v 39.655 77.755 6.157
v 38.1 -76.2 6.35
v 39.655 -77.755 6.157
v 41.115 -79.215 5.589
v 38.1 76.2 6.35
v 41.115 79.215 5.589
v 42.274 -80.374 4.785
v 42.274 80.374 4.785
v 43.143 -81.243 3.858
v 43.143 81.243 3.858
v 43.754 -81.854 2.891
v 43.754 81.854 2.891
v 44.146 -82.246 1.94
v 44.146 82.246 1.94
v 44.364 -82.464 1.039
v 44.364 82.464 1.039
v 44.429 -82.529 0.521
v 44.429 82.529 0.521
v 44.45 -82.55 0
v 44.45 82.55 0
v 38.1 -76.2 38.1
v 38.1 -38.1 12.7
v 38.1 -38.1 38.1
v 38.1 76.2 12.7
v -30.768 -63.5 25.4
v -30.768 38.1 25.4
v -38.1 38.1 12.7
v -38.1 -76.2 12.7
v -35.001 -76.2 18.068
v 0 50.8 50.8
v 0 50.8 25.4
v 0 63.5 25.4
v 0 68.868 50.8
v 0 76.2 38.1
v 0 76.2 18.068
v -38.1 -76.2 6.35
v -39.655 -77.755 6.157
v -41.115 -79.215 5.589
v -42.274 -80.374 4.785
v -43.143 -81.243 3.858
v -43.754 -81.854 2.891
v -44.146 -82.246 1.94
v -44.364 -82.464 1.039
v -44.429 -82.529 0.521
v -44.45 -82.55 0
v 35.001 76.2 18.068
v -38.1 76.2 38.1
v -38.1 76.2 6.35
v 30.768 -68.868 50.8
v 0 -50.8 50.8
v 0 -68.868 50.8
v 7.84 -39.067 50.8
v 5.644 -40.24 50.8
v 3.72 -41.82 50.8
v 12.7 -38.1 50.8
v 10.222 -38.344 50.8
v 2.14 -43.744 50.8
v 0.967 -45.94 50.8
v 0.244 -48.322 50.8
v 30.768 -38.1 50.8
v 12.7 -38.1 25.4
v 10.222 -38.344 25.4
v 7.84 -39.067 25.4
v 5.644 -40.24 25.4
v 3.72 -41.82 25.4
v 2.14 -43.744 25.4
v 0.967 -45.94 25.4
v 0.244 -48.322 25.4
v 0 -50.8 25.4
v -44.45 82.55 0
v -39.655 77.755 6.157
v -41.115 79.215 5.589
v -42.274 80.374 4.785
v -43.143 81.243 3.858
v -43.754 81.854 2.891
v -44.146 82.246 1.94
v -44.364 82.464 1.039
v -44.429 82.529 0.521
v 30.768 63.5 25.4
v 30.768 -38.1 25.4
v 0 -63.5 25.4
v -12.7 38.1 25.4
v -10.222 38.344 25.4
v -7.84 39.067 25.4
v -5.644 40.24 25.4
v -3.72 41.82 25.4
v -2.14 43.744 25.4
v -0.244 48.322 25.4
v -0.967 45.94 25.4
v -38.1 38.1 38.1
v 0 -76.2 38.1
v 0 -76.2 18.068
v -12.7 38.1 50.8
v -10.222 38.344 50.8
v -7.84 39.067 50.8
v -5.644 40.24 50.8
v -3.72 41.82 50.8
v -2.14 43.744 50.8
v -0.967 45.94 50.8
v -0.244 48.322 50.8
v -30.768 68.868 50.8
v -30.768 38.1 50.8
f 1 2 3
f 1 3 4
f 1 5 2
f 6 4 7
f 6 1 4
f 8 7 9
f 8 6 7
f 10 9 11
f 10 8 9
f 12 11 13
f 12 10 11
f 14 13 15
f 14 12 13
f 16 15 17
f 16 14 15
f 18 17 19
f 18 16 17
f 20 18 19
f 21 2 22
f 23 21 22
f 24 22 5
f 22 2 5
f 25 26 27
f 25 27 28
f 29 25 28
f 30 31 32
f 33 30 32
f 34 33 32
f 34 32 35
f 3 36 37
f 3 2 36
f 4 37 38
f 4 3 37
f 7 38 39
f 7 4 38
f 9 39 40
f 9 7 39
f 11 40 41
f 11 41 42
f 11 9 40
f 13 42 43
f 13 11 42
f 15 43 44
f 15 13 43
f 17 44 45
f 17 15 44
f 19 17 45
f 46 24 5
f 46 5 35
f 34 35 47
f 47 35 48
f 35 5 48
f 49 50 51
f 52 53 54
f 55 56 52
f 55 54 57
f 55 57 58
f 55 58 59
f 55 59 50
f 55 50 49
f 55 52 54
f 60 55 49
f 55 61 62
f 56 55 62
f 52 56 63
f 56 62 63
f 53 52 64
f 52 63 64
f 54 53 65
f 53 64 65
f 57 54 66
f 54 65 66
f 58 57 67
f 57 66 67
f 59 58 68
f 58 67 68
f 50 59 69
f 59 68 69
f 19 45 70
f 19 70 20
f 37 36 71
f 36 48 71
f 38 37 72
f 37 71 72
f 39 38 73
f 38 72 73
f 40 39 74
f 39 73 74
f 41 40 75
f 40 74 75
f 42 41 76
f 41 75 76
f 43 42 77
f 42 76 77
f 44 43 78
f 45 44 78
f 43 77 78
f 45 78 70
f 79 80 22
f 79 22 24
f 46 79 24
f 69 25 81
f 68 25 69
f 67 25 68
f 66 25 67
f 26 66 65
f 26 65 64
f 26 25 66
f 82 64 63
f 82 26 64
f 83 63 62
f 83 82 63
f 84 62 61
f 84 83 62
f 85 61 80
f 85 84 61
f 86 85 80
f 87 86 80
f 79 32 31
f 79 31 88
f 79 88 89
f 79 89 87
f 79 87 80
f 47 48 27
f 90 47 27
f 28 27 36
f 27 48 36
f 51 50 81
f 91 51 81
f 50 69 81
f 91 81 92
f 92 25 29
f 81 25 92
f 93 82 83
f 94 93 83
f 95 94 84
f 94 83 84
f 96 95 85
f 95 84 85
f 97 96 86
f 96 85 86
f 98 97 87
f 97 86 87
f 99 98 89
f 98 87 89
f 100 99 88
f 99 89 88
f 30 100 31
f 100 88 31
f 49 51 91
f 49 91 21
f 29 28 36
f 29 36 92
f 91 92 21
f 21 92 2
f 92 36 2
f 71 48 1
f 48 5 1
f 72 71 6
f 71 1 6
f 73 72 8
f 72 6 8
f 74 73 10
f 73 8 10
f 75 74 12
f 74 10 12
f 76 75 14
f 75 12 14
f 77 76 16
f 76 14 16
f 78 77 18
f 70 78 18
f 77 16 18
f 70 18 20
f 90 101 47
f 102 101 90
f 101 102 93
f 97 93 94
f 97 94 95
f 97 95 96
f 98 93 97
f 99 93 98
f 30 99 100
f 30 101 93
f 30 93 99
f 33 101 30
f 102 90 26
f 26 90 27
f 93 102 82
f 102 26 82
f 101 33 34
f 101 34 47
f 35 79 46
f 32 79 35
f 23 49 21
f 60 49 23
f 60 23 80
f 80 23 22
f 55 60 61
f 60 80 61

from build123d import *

# Parameters (mm, degrees)
F0_W        = 88.9
F0_H        = 165.1
F1_DEPTH    = 6.35
F2_DEPTH    = 25.4
F3_DEPTH    = 50.8
F4_C1_SIZE2 = 7.3323484187
F4_C1_SIZE  = 12.7
F4_C2_SIZE2 = 7.3323484187
F4_C2_SIZE  = 12.7
F4_C3_SIZE2 = 12.7
F4_C3_SIZE  = 7.3323484187
F4_C4_SIZE2 = 7.3323484187
F4_C4_SIZE  = 12.7
F5_C1_SIZE2 = 12.7
F5_C1_SIZE  = 7.3323484187
F5_C2_SIZE2 = 7.3323484187
F5_C2_SIZE  = 12.7
F5_C3_SIZE2 = 7.3323484187
F5_C3_SIZE  = 12.7
F5_C4_SIZE2 = 7.3323484187
F5_C4_SIZE  = 12.7
F6_R        = 6.34999


# Not quite as in the source:
# - a fillet or chamfer is up to 0.001 mm smaller than in the source, because OpenCascade refuses the exact size


with BuildPart() as f1:
    # F0 (on Top) → F1 (new body)
    with BuildSketch(Plane.XY):
        Rectangle(F0_W, F0_H)
        Polygon((0, 76.2), (38.1, 76.2), (38.1, -38.1), (38.1, -76.2), (0, -76.2), (-38.1, -76.2), (-38.1, 38.1), (-38.1, 76.2), align=None, mode=Mode.SUBTRACT)
    extrude(amount=F1_DEPTH)

    # F0 (on Top) → F2 (join)
    with BuildSketch(Plane.XY):
        with BuildLine():
            Line((38.1, -38.1), (38.1, 76.2))
            Line((38.1, 76.2), (0, 76.2))
            Line((0, 76.2), (0, 50.8))
            ThreePointArc((0, 50.8), (-3.7197438789, 41.8197438789), (-12.7, 38.1))
            Line((-12.7, 38.1), (-38.1, 38.1))
            Line((-38.1, 38.1), (-38.1, -76.2))
            Line((-38.1, -76.2), (0, -76.2))
            Line((0, -76.2), (0, -50.8))
            ThreePointArc((0, -50.8), (3.7197438789, -41.8197438789), (12.7, -38.1))
            Line((12.7, -38.1), (38.1, -38.1))
        make_face()
    extrude(amount=F2_DEPTH)

    # F0 (on Top) → F3 (join)
    with BuildSketch(Plane.XY):
        with BuildLine():
            Line((0, 50.8), (0, 76.2))
            Line((0, 76.2), (-38.1, 76.2))
            Line((-38.1, 76.2), (-38.1, 38.1))
            Line((-38.1, 38.1), (-12.7, 38.1))
            ThreePointArc((-12.7, 38.1), (-3.7197438789, 41.8197438789), (0, 50.8))
        make_face()
        with BuildLine():
            Line((38.1, -76.2), (38.1, -38.1))
            Line((38.1, -38.1), (12.7, -38.1))
            ThreePointArc((12.7, -38.1), (3.7197438789, -41.8197438789), (0, -50.8))
            Line((0, -50.8), (0, -76.2))
            Line((0, -76.2), (38.1, -76.2))
        make_face()
    extrude(amount=F3_DEPTH)

    # F4: chamfer of 12.7 x 7.3323484187 on 4 edges, made by hand

    # F4_c1
    f4_c1_edges = [f1.edges().sort_by_distance(p)[0] for p in [
        (-38.1, 57.15, 50.8),
    ]]
    f4_c1_side = f1.faces().sort_by_distance((-38.1, 57.15, 50.6533530316))[0]
    chamfer(f4_c1_edges, length=F4_C1_SIZE, length2=F4_C1_SIZE2, reference=f4_c1_side)

    # F4_c2
    f4_c2_edges = [f1.edges().sort_by_distance(p)[0] for p in [
        (-38.1, -19.05, 25.4),
    ]]
    f4_c2_side = f1.faces().sort_by_distance((-38.1, -19.05, 25.2533530316))[0]
    chamfer(f4_c2_edges, length=F4_C2_SIZE, length2=F4_C2_SIZE2, reference=f4_c2_side)

    # F4_c3
    f4_c3_edges = [f1.edges().sort_by_distance(p)[0] for p in [
        (-15.3838257906, -76.2, 25.4),
    ]]
    f4_c3_side = f1.faces().sort_by_distance((-15.3838257906, -76.2, 25.2533530316))[0]
    chamfer(f4_c3_edges, length=F4_C3_SIZE, length2=F4_C3_SIZE2, reference=f4_c3_side)

    # F4_c4
    f4_c4_edges = [f1.edges().sort_by_distance(p)[0] for p in [
        (-15.3838257906, 76.2, 50.8),
    ]]
    f4_c4_side = f1.faces().sort_by_distance((-15.3838257906, 76.2, 50.6533530316))[0]
    chamfer(f4_c4_edges, length=F4_C4_SIZE, length2=F4_C4_SIZE2, reference=f4_c4_side)

    # F5: chamfer of 12.7 x 7.3323484187 on 4 edges, made by hand

    # F5_c1
    f5_c1_edges = [f1.edges().sort_by_distance(p)[0] for p in [
        (19.05, 76.2, 25.4),
    ]]
    f5_c1_side = f1.faces().sort_by_distance((19.05, 76.2, 25.2533530316))[0]
    chamfer(f5_c1_edges, length=F5_C1_SIZE, length2=F5_C1_SIZE2, reference=f5_c1_side)

    # F5_c2
    f5_c2_edges = [f1.edges().sort_by_distance(p)[0] for p in [
        (38.1, 12.7, 25.4),
    ]]
    f5_c2_side = f1.faces().sort_by_distance((38.1, 12.7, 25.2533530316))[0]
    chamfer(f5_c2_edges, length=F5_C2_SIZE, length2=F5_C2_SIZE2, reference=f5_c2_side)

    # F5_c3
    f5_c3_edges = [f1.edges().sort_by_distance(p)[0] for p in [
        (38.1, -57.15, 50.8),
    ]]
    f5_c3_side = f1.faces().sort_by_distance((38.1, -57.15, 50.6533530316))[0]
    chamfer(f5_c3_edges, length=F5_C3_SIZE, length2=F5_C3_SIZE2, reference=f5_c3_side)

    # F5_c4
    f5_c4_edges = [f1.edges().sort_by_distance(p)[0] for p in [
        (15.3838257906, -76.2, 50.8),
    ]]
    f5_c4_side = f1.faces().sort_by_distance((15.3838257906, -76.2, 50.6533530316))[0]
    chamfer(f5_c4_edges, length=F5_C4_SIZE, length2=F5_C4_SIZE2, reference=f5_c4_side)

    # F6 (radius 6.35 in the source; OpenCascade refuses exactly that, so slightly less here)
    f6_edges = [f1.edges().sort_by_distance(p)[0] for p in [
        (-44.45, 0, 6.35),
        (0, -82.55, 6.35),
        (0, 82.55, 6.35),
        (44.45, 0, 6.35),
    ]]
    fillet(f6_edges, radius=F6_R)


solid = f1.part
